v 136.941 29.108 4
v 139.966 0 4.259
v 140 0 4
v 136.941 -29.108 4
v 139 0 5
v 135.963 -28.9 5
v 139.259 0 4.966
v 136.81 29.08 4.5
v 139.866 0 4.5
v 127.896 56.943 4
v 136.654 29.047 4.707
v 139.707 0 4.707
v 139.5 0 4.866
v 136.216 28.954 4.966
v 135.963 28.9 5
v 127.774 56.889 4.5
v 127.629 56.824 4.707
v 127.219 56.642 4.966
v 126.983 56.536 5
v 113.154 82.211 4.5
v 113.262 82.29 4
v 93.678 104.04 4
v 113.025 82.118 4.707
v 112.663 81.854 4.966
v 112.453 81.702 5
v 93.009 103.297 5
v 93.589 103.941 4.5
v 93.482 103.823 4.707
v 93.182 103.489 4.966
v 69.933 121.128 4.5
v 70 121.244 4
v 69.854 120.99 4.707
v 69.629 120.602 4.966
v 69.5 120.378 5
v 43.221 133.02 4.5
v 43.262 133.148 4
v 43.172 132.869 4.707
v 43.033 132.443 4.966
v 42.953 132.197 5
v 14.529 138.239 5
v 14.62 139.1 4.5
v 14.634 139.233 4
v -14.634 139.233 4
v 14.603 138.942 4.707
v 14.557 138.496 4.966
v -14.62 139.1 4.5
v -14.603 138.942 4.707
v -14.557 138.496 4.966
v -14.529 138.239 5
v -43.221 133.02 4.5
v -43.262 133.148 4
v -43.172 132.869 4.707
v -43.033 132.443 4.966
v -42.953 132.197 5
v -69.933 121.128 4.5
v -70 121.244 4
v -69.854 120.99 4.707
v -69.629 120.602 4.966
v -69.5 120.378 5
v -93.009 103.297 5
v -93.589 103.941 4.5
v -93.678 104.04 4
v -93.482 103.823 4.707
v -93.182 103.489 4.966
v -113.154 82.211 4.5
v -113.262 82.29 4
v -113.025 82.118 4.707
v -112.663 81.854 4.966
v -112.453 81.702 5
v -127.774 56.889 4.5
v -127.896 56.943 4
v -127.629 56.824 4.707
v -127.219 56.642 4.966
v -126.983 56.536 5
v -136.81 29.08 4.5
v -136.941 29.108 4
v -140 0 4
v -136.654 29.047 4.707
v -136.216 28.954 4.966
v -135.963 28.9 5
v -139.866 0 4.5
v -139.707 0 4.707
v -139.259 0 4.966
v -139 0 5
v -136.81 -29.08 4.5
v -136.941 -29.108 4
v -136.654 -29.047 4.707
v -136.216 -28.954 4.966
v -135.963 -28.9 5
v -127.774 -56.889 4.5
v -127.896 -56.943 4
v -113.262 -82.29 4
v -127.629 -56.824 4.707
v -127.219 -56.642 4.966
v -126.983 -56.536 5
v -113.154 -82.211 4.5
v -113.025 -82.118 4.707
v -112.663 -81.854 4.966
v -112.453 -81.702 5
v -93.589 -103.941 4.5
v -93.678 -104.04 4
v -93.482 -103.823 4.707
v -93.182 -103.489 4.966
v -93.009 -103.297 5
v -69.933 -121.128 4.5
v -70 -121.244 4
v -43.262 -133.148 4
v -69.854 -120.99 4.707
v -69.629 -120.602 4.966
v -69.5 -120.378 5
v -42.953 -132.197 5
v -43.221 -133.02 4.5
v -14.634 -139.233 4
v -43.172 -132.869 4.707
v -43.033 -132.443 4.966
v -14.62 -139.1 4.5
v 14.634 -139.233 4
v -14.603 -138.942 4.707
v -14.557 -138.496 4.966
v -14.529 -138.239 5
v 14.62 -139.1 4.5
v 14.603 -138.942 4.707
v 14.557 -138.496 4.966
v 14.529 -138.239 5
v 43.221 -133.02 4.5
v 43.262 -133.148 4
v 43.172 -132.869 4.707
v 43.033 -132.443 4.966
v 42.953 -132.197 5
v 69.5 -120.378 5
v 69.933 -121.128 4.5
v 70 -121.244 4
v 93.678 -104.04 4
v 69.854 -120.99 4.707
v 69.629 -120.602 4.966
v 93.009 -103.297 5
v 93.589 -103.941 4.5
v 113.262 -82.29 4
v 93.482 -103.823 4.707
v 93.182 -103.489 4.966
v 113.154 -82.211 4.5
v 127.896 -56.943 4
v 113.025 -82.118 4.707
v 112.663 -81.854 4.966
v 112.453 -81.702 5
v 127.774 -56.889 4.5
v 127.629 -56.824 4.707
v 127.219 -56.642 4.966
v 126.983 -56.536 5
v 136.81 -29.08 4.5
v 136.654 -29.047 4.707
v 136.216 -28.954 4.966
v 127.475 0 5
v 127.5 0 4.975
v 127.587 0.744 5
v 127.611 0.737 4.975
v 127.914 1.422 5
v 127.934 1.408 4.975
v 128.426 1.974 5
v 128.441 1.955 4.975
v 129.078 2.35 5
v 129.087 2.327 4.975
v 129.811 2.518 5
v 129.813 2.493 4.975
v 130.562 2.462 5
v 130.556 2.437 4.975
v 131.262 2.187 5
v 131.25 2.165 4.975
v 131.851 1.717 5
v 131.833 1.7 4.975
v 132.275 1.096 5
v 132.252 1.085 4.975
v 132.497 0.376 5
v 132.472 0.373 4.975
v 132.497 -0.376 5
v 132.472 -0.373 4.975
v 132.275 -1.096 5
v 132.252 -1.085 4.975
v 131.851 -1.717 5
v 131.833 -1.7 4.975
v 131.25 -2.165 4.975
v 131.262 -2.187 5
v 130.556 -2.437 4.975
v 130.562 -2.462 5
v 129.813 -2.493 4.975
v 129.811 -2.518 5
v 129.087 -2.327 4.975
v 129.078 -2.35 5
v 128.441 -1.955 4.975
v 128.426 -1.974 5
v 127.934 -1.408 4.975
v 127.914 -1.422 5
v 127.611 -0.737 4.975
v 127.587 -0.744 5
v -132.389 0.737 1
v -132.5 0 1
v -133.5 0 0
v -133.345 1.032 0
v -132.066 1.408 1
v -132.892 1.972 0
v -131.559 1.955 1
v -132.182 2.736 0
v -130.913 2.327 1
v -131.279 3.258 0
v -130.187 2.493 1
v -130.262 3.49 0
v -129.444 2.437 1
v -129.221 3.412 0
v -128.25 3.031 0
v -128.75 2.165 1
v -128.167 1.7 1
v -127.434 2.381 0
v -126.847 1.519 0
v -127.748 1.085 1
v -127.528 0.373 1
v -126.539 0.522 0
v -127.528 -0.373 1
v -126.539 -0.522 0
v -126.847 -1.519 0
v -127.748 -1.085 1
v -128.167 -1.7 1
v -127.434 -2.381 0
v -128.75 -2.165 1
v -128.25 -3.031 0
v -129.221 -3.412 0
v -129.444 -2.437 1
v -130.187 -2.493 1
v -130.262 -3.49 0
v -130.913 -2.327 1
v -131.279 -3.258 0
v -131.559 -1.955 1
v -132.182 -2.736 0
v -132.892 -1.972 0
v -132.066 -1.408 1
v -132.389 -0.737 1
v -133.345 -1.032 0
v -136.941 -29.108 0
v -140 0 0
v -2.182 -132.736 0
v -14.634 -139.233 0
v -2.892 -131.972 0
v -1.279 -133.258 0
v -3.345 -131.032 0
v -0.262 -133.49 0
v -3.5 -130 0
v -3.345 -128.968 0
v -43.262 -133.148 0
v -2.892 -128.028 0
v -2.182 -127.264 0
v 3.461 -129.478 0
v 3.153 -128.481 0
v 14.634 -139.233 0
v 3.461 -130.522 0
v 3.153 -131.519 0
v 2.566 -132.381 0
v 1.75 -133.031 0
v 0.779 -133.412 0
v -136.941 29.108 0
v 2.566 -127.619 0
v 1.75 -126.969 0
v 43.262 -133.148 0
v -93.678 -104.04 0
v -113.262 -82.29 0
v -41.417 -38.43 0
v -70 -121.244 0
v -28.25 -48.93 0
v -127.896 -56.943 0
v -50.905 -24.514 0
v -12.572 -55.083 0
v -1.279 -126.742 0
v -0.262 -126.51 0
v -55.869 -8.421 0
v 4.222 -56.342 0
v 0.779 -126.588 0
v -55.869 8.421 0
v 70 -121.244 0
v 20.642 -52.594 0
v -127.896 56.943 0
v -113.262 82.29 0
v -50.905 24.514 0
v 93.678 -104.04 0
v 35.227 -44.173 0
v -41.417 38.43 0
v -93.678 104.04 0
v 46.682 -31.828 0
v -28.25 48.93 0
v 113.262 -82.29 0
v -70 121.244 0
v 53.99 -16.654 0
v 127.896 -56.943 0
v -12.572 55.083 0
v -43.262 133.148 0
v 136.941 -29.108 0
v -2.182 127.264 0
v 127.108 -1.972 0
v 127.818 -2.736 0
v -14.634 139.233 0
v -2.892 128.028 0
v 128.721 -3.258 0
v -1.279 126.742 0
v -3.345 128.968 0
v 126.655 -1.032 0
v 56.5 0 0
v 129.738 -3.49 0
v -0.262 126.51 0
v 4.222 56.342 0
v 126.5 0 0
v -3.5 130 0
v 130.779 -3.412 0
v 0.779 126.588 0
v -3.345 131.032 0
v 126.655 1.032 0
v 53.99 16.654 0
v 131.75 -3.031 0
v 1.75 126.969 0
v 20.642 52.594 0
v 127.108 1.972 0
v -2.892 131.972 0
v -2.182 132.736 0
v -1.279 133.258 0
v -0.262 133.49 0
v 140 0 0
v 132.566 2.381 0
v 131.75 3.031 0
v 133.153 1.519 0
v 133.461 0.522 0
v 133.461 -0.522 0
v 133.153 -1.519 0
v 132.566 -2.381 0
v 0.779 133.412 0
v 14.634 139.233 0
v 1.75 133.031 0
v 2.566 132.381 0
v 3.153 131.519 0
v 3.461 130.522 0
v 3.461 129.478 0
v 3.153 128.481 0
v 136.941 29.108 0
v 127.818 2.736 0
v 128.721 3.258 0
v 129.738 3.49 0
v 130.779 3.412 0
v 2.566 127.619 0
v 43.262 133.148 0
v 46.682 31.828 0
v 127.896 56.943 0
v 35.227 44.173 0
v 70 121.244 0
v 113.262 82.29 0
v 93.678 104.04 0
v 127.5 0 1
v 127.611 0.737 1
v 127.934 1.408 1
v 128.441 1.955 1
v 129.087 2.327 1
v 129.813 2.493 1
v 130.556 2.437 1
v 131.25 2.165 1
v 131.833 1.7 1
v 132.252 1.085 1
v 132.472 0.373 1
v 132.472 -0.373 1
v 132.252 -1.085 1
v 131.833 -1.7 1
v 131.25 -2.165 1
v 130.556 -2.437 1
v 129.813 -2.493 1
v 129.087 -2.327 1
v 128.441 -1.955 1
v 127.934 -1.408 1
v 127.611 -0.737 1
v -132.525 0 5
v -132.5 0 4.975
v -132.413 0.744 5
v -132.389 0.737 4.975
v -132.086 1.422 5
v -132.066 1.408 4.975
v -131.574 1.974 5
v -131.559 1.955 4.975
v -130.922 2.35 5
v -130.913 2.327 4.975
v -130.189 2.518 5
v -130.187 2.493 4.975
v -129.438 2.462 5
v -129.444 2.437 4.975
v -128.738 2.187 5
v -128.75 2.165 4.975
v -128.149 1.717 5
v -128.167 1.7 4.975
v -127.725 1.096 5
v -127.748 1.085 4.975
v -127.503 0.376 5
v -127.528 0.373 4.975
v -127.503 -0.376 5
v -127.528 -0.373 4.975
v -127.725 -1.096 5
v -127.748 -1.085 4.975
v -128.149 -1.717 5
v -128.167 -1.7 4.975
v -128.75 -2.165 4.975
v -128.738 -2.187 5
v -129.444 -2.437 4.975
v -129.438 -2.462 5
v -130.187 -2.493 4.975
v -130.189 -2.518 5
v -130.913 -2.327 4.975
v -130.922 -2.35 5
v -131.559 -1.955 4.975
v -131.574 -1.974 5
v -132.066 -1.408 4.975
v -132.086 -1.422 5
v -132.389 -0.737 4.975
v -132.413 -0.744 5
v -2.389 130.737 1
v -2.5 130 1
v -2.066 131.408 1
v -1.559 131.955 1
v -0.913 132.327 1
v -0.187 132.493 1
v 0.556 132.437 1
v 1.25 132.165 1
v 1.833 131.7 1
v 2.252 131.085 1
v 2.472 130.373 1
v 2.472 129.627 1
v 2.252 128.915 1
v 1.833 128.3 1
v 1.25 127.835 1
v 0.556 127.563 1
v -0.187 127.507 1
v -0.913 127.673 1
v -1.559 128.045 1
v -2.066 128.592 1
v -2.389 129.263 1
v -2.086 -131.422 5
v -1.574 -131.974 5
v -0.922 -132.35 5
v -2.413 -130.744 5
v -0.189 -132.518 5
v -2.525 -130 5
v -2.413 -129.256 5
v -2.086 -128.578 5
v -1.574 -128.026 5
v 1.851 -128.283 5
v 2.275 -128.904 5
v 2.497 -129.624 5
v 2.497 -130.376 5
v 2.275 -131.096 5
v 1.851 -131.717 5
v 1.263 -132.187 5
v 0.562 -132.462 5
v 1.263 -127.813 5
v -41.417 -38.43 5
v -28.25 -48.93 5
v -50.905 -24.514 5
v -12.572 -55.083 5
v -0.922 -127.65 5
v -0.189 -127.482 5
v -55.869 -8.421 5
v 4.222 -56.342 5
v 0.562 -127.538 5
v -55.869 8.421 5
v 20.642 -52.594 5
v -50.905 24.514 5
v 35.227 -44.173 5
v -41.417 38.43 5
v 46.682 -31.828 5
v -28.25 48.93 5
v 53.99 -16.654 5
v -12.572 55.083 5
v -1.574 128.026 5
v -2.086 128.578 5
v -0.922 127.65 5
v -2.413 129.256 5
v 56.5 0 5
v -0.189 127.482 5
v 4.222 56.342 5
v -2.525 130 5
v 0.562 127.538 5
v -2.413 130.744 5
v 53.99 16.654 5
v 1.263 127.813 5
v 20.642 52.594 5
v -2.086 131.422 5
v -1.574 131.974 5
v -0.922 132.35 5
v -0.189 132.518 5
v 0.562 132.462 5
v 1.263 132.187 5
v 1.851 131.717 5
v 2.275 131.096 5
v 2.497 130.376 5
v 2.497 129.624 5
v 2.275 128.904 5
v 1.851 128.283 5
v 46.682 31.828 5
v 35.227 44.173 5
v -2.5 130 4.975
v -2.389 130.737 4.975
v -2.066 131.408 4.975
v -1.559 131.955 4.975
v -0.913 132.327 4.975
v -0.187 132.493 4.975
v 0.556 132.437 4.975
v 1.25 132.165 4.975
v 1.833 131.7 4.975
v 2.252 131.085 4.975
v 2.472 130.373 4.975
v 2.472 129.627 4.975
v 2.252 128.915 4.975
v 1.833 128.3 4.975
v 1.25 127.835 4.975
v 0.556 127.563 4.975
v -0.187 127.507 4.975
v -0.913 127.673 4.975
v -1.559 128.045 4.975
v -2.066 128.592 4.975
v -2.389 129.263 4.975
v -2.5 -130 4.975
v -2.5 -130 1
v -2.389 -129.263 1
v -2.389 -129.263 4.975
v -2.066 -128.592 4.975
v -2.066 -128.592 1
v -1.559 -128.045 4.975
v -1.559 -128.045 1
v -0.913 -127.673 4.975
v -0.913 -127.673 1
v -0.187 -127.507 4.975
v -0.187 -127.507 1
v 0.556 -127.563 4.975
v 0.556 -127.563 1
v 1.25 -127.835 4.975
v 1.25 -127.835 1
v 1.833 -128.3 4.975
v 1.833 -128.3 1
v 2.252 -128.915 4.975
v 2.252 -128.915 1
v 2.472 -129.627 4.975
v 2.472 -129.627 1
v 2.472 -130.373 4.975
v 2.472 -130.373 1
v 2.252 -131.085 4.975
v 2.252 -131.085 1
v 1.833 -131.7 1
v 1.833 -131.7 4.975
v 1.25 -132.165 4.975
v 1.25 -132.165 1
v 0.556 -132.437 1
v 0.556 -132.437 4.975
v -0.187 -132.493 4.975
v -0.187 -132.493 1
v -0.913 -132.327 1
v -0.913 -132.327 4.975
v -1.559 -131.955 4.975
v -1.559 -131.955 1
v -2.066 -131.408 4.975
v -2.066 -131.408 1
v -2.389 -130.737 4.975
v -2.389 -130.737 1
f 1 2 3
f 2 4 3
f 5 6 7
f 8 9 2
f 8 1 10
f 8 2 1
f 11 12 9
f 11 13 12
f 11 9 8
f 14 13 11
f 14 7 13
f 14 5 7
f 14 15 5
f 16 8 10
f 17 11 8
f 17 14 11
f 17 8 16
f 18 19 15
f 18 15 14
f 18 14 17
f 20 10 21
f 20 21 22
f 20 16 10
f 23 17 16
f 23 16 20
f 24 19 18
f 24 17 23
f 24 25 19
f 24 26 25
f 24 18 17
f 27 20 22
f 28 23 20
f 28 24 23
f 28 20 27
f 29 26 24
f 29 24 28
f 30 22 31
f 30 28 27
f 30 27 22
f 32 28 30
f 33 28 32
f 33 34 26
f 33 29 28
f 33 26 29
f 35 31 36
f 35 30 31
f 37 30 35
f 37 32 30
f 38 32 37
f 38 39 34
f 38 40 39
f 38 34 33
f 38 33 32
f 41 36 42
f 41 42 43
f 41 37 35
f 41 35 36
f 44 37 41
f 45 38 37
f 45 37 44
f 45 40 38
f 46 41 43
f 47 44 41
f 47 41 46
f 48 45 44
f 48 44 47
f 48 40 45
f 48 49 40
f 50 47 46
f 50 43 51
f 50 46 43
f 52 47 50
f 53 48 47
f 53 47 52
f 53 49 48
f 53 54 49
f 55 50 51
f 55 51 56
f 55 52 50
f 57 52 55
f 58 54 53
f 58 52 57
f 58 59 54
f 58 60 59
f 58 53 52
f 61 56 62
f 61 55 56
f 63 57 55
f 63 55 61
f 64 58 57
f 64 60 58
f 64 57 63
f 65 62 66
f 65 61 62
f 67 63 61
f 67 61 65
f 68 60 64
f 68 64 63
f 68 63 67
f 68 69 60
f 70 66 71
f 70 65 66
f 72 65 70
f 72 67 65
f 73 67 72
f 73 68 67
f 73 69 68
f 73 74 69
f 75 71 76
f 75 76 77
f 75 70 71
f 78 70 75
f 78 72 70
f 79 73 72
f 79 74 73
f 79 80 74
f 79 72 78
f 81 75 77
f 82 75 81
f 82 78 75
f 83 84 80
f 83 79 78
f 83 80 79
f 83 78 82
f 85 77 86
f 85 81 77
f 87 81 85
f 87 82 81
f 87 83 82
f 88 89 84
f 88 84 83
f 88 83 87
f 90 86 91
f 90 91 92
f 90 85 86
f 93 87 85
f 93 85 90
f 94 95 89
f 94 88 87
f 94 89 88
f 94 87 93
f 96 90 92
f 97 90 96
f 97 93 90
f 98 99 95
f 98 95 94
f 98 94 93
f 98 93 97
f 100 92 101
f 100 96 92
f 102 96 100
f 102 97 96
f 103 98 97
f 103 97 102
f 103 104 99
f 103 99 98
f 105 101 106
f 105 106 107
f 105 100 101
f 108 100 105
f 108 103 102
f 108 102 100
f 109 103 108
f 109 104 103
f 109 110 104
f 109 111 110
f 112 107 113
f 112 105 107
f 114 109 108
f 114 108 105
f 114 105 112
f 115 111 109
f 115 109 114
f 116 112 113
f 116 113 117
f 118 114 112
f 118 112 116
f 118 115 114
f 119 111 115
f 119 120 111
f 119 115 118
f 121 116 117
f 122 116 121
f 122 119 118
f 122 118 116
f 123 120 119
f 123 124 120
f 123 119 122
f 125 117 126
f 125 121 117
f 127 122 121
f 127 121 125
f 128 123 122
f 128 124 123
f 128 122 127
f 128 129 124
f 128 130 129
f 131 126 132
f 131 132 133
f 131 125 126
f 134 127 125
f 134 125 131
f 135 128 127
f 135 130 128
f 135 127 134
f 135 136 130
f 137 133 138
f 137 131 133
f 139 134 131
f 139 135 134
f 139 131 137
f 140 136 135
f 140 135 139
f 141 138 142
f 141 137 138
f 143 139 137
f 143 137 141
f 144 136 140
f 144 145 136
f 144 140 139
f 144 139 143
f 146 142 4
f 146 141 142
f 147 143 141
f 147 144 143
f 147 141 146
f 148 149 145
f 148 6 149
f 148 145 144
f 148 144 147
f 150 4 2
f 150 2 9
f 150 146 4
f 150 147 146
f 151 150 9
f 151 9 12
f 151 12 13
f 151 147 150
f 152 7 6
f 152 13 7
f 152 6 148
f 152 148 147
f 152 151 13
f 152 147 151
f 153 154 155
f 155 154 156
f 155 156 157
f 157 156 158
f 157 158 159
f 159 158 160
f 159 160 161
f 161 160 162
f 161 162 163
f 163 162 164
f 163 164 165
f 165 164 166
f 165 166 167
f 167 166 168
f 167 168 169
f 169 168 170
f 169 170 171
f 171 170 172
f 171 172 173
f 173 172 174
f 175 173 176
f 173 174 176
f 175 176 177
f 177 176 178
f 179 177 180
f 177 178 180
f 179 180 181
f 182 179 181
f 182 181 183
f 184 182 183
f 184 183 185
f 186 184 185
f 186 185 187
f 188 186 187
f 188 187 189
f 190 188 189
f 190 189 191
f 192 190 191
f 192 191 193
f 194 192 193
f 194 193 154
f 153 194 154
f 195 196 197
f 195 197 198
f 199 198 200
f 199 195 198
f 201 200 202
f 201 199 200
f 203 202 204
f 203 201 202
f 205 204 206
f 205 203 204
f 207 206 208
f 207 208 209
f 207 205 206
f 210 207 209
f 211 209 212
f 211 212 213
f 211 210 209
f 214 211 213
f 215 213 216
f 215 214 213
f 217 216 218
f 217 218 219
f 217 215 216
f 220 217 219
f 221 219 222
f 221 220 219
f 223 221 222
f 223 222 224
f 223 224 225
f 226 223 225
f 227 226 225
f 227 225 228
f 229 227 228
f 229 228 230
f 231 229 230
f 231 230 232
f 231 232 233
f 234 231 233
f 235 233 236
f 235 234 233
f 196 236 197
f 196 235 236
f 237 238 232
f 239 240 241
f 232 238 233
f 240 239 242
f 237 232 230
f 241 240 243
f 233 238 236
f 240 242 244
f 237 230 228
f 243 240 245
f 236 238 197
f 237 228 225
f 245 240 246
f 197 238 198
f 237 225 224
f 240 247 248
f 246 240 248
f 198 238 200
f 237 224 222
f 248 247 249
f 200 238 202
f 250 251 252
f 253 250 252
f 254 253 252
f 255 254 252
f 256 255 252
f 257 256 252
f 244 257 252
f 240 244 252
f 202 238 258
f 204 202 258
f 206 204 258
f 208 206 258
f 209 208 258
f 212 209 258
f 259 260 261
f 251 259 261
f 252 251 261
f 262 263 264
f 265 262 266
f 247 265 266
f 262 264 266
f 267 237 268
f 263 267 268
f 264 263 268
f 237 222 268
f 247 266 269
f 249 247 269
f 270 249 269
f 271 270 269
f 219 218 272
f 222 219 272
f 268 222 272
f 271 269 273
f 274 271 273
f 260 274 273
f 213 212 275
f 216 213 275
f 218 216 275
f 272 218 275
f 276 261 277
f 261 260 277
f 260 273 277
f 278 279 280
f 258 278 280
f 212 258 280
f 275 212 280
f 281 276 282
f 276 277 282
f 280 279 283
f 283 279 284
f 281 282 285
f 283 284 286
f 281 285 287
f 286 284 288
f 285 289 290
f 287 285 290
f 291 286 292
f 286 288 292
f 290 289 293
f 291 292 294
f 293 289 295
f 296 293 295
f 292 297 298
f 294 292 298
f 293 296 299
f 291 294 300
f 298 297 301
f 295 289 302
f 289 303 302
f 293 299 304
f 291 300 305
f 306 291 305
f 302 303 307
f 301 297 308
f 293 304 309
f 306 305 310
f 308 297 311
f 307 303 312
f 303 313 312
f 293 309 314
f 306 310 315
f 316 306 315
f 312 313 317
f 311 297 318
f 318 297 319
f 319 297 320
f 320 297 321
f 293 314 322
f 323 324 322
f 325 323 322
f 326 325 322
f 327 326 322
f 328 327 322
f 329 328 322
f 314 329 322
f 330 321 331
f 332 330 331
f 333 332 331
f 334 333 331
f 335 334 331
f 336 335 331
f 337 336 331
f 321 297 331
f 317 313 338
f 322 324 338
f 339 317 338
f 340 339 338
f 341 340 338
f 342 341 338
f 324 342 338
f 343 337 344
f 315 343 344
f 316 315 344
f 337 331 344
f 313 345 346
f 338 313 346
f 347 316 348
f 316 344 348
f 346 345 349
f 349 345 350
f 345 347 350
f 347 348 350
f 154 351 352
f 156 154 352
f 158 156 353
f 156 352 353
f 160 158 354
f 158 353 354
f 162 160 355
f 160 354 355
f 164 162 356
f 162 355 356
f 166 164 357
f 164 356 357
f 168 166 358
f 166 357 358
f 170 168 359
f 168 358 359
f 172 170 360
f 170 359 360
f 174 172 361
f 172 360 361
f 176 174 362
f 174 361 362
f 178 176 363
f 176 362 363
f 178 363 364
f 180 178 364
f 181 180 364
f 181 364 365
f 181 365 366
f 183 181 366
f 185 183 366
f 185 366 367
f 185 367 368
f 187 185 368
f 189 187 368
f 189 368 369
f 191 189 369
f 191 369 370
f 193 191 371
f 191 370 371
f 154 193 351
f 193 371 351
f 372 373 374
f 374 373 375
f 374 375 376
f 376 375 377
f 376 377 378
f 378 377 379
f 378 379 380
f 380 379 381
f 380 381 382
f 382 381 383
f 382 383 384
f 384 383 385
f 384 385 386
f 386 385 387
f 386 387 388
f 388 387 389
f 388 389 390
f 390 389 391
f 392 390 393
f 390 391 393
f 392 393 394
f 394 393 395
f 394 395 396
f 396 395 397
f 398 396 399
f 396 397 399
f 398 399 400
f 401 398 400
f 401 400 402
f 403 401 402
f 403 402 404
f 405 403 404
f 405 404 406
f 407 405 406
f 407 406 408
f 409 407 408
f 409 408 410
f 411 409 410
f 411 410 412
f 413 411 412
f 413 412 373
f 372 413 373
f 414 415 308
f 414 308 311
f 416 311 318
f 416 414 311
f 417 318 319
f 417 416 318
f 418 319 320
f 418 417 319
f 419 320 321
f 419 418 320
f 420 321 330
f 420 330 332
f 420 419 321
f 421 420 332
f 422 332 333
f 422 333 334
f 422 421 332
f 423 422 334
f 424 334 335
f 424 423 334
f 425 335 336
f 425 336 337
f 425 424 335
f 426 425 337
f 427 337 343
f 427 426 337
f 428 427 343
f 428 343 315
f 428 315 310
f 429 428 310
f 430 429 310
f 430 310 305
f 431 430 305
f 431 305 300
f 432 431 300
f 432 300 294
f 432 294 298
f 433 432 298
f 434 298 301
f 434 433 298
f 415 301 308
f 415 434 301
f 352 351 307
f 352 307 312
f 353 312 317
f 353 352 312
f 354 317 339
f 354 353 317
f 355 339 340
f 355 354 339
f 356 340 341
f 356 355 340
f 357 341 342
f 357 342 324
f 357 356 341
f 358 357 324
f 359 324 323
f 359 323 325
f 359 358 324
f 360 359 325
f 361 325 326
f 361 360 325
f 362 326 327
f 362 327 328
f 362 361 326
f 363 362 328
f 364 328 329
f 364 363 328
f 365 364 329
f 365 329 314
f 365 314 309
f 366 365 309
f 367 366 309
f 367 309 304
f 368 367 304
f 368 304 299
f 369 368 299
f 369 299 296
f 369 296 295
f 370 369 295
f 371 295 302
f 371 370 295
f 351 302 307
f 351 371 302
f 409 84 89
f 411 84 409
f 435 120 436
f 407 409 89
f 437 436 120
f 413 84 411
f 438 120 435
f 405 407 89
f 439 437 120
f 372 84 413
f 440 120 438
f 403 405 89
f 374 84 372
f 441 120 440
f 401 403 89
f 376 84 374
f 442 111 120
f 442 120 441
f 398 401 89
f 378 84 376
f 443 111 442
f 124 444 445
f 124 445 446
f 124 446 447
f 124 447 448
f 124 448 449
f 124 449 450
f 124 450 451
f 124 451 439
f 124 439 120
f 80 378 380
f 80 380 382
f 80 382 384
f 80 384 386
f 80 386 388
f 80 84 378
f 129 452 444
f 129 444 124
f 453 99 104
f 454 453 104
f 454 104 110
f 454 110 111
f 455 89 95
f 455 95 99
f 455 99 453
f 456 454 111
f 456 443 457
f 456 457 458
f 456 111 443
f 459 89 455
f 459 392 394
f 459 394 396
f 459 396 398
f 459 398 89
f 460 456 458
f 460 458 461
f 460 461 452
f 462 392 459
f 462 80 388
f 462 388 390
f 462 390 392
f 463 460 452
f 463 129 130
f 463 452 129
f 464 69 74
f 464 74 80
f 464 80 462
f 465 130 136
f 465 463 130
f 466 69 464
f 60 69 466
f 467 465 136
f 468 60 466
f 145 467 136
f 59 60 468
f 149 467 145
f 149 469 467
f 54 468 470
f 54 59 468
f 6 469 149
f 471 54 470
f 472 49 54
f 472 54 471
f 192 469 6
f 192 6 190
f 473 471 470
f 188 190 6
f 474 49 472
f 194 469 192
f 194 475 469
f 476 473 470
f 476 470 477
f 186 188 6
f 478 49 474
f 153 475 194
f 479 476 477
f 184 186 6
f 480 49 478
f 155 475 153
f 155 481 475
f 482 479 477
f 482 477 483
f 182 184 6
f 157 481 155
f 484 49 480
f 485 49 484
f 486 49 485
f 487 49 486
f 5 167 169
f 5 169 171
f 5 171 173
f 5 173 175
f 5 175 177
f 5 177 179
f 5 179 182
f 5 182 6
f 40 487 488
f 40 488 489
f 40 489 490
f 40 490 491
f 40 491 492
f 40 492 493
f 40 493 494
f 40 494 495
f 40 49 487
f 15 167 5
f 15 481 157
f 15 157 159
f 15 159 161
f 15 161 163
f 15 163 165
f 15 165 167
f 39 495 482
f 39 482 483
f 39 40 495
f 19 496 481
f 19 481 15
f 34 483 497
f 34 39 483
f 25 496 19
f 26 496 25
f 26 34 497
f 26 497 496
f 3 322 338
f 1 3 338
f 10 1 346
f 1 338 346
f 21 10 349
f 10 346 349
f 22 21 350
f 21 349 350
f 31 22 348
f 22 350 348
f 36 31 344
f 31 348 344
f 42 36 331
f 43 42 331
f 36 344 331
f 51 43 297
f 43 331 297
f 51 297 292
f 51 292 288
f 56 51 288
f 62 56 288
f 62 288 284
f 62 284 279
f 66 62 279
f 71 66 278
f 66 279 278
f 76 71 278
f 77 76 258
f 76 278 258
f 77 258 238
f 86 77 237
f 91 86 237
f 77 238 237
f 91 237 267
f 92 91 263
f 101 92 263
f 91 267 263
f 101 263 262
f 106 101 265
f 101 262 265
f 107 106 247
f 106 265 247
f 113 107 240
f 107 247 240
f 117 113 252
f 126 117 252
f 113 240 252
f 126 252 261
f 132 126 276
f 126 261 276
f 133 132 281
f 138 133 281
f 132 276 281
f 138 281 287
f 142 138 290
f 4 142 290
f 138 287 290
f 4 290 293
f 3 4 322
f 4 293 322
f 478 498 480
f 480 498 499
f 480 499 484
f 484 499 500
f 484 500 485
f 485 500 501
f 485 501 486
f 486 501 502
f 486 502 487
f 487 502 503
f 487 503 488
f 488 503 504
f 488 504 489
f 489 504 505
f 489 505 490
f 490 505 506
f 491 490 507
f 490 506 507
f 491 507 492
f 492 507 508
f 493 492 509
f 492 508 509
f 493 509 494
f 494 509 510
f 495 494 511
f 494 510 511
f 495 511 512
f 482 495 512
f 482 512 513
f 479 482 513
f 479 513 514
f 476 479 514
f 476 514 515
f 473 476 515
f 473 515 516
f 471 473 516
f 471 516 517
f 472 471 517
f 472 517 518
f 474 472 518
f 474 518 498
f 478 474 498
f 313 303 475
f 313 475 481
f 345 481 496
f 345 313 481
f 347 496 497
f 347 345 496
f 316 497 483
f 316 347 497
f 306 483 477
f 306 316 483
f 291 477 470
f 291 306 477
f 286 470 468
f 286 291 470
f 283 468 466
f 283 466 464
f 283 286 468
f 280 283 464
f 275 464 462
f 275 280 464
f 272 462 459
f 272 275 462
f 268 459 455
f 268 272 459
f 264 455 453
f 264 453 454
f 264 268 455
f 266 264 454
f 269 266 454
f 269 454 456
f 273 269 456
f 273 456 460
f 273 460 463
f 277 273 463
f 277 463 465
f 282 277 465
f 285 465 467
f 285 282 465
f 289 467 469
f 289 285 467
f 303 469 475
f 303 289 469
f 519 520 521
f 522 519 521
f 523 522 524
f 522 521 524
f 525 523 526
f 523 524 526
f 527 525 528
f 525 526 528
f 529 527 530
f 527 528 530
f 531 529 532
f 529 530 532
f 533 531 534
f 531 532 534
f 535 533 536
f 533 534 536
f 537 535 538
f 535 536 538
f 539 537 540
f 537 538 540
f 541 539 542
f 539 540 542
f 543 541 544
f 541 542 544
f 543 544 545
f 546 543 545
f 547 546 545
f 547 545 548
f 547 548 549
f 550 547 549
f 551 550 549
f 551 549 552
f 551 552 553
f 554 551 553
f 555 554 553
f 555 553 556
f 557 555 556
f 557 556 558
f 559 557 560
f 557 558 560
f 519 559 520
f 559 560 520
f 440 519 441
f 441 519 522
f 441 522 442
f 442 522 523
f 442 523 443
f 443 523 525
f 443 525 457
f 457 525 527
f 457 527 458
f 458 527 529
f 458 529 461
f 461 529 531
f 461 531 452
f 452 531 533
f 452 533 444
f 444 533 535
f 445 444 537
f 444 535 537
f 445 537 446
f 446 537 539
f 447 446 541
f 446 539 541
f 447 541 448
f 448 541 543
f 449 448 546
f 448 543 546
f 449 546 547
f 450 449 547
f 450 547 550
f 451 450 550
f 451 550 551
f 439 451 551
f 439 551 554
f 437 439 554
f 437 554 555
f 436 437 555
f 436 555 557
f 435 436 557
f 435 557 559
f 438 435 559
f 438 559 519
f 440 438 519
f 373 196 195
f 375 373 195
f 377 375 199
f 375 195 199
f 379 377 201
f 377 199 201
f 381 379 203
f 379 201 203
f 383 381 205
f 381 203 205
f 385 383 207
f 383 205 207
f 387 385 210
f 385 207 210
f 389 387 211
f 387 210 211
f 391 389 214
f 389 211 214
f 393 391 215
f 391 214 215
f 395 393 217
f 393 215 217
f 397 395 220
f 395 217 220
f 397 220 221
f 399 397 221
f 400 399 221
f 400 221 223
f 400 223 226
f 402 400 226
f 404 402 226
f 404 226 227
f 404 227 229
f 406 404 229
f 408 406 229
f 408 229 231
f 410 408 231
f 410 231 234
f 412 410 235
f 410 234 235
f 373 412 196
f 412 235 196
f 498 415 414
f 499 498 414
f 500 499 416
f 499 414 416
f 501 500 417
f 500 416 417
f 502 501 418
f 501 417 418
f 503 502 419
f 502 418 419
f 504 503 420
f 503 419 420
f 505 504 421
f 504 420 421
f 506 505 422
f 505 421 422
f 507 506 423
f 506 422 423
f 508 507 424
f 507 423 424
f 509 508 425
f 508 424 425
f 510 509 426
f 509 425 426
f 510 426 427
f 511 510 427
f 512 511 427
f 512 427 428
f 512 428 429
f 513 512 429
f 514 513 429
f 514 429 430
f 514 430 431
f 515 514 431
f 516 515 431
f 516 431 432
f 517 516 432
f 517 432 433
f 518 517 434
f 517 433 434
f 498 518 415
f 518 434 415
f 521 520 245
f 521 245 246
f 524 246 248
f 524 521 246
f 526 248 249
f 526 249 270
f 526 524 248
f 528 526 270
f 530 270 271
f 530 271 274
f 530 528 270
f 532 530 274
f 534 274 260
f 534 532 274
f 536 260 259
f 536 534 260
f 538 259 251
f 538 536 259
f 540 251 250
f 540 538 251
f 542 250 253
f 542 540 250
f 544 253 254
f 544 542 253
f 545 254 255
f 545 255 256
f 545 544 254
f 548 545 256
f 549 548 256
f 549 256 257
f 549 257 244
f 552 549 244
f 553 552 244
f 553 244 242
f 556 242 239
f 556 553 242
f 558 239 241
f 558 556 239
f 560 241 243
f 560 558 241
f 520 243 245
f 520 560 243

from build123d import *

# Parameters (mm, degrees)
SKETCH1_R                       = 140
SKETCH1_R_2                     = 56.5
BOSS_EXTRUDE1_DEPTH             = 5
F_5_0MM_DOWEL_HOLE1_D           = 5
F_5_0MM_DOWEL_HOLE1_CSINK_D     = 5.05
F_5_0MM_DOWEL_HOLE1_CSINK_ANGLE = 90
FILLET1_R                       = 1
CHAMFER1_SIZE                   = 1


with BuildPart() as part:
    # Sketch1 → Boss-Extrude1 (new body)
    with BuildSketch(Plane.XY):
        Circle(SKETCH1_R)
        Circle(SKETCH1_R_2, mode=Mode.SUBTRACT)
    extrude(amount=BOSS_EXTRUDE1_DEPTH)

    # Ø5.0mm Dowel Hole1 (through all)
    with Locations(Plane.XY.offset(5)):
        with Locations((0, 130), (0, -130), (130, 0), (-130, 0)):
            CounterSinkHole(F_5_0MM_DOWEL_HOLE1_D / 2, F_5_0MM_DOWEL_HOLE1_CSINK_D / 2, counter_sink_angle=F_5_0MM_DOWEL_HOLE1_CSINK_ANGLE)

    # Fillet1
    fillet1_edges = [part.edges().sort_by_distance(p)[0] for p in [
        (-140, 0, 5),
    ]]
    fillet(fillet1_edges, radius=FILLET1_R)

    # Chamfer1
    chamfer1_edges = [part.edges().sort_by_distance(p)[0] for p in [
        (-127.5, 0, 0),
        (132.5, 0, 0),
        (2.5, -130, 0),
        (2.5, 130, 0),
    ]]
    chamfer(chamfer1_edges, length=CHAMFER1_SIZE)


solid = part.part
